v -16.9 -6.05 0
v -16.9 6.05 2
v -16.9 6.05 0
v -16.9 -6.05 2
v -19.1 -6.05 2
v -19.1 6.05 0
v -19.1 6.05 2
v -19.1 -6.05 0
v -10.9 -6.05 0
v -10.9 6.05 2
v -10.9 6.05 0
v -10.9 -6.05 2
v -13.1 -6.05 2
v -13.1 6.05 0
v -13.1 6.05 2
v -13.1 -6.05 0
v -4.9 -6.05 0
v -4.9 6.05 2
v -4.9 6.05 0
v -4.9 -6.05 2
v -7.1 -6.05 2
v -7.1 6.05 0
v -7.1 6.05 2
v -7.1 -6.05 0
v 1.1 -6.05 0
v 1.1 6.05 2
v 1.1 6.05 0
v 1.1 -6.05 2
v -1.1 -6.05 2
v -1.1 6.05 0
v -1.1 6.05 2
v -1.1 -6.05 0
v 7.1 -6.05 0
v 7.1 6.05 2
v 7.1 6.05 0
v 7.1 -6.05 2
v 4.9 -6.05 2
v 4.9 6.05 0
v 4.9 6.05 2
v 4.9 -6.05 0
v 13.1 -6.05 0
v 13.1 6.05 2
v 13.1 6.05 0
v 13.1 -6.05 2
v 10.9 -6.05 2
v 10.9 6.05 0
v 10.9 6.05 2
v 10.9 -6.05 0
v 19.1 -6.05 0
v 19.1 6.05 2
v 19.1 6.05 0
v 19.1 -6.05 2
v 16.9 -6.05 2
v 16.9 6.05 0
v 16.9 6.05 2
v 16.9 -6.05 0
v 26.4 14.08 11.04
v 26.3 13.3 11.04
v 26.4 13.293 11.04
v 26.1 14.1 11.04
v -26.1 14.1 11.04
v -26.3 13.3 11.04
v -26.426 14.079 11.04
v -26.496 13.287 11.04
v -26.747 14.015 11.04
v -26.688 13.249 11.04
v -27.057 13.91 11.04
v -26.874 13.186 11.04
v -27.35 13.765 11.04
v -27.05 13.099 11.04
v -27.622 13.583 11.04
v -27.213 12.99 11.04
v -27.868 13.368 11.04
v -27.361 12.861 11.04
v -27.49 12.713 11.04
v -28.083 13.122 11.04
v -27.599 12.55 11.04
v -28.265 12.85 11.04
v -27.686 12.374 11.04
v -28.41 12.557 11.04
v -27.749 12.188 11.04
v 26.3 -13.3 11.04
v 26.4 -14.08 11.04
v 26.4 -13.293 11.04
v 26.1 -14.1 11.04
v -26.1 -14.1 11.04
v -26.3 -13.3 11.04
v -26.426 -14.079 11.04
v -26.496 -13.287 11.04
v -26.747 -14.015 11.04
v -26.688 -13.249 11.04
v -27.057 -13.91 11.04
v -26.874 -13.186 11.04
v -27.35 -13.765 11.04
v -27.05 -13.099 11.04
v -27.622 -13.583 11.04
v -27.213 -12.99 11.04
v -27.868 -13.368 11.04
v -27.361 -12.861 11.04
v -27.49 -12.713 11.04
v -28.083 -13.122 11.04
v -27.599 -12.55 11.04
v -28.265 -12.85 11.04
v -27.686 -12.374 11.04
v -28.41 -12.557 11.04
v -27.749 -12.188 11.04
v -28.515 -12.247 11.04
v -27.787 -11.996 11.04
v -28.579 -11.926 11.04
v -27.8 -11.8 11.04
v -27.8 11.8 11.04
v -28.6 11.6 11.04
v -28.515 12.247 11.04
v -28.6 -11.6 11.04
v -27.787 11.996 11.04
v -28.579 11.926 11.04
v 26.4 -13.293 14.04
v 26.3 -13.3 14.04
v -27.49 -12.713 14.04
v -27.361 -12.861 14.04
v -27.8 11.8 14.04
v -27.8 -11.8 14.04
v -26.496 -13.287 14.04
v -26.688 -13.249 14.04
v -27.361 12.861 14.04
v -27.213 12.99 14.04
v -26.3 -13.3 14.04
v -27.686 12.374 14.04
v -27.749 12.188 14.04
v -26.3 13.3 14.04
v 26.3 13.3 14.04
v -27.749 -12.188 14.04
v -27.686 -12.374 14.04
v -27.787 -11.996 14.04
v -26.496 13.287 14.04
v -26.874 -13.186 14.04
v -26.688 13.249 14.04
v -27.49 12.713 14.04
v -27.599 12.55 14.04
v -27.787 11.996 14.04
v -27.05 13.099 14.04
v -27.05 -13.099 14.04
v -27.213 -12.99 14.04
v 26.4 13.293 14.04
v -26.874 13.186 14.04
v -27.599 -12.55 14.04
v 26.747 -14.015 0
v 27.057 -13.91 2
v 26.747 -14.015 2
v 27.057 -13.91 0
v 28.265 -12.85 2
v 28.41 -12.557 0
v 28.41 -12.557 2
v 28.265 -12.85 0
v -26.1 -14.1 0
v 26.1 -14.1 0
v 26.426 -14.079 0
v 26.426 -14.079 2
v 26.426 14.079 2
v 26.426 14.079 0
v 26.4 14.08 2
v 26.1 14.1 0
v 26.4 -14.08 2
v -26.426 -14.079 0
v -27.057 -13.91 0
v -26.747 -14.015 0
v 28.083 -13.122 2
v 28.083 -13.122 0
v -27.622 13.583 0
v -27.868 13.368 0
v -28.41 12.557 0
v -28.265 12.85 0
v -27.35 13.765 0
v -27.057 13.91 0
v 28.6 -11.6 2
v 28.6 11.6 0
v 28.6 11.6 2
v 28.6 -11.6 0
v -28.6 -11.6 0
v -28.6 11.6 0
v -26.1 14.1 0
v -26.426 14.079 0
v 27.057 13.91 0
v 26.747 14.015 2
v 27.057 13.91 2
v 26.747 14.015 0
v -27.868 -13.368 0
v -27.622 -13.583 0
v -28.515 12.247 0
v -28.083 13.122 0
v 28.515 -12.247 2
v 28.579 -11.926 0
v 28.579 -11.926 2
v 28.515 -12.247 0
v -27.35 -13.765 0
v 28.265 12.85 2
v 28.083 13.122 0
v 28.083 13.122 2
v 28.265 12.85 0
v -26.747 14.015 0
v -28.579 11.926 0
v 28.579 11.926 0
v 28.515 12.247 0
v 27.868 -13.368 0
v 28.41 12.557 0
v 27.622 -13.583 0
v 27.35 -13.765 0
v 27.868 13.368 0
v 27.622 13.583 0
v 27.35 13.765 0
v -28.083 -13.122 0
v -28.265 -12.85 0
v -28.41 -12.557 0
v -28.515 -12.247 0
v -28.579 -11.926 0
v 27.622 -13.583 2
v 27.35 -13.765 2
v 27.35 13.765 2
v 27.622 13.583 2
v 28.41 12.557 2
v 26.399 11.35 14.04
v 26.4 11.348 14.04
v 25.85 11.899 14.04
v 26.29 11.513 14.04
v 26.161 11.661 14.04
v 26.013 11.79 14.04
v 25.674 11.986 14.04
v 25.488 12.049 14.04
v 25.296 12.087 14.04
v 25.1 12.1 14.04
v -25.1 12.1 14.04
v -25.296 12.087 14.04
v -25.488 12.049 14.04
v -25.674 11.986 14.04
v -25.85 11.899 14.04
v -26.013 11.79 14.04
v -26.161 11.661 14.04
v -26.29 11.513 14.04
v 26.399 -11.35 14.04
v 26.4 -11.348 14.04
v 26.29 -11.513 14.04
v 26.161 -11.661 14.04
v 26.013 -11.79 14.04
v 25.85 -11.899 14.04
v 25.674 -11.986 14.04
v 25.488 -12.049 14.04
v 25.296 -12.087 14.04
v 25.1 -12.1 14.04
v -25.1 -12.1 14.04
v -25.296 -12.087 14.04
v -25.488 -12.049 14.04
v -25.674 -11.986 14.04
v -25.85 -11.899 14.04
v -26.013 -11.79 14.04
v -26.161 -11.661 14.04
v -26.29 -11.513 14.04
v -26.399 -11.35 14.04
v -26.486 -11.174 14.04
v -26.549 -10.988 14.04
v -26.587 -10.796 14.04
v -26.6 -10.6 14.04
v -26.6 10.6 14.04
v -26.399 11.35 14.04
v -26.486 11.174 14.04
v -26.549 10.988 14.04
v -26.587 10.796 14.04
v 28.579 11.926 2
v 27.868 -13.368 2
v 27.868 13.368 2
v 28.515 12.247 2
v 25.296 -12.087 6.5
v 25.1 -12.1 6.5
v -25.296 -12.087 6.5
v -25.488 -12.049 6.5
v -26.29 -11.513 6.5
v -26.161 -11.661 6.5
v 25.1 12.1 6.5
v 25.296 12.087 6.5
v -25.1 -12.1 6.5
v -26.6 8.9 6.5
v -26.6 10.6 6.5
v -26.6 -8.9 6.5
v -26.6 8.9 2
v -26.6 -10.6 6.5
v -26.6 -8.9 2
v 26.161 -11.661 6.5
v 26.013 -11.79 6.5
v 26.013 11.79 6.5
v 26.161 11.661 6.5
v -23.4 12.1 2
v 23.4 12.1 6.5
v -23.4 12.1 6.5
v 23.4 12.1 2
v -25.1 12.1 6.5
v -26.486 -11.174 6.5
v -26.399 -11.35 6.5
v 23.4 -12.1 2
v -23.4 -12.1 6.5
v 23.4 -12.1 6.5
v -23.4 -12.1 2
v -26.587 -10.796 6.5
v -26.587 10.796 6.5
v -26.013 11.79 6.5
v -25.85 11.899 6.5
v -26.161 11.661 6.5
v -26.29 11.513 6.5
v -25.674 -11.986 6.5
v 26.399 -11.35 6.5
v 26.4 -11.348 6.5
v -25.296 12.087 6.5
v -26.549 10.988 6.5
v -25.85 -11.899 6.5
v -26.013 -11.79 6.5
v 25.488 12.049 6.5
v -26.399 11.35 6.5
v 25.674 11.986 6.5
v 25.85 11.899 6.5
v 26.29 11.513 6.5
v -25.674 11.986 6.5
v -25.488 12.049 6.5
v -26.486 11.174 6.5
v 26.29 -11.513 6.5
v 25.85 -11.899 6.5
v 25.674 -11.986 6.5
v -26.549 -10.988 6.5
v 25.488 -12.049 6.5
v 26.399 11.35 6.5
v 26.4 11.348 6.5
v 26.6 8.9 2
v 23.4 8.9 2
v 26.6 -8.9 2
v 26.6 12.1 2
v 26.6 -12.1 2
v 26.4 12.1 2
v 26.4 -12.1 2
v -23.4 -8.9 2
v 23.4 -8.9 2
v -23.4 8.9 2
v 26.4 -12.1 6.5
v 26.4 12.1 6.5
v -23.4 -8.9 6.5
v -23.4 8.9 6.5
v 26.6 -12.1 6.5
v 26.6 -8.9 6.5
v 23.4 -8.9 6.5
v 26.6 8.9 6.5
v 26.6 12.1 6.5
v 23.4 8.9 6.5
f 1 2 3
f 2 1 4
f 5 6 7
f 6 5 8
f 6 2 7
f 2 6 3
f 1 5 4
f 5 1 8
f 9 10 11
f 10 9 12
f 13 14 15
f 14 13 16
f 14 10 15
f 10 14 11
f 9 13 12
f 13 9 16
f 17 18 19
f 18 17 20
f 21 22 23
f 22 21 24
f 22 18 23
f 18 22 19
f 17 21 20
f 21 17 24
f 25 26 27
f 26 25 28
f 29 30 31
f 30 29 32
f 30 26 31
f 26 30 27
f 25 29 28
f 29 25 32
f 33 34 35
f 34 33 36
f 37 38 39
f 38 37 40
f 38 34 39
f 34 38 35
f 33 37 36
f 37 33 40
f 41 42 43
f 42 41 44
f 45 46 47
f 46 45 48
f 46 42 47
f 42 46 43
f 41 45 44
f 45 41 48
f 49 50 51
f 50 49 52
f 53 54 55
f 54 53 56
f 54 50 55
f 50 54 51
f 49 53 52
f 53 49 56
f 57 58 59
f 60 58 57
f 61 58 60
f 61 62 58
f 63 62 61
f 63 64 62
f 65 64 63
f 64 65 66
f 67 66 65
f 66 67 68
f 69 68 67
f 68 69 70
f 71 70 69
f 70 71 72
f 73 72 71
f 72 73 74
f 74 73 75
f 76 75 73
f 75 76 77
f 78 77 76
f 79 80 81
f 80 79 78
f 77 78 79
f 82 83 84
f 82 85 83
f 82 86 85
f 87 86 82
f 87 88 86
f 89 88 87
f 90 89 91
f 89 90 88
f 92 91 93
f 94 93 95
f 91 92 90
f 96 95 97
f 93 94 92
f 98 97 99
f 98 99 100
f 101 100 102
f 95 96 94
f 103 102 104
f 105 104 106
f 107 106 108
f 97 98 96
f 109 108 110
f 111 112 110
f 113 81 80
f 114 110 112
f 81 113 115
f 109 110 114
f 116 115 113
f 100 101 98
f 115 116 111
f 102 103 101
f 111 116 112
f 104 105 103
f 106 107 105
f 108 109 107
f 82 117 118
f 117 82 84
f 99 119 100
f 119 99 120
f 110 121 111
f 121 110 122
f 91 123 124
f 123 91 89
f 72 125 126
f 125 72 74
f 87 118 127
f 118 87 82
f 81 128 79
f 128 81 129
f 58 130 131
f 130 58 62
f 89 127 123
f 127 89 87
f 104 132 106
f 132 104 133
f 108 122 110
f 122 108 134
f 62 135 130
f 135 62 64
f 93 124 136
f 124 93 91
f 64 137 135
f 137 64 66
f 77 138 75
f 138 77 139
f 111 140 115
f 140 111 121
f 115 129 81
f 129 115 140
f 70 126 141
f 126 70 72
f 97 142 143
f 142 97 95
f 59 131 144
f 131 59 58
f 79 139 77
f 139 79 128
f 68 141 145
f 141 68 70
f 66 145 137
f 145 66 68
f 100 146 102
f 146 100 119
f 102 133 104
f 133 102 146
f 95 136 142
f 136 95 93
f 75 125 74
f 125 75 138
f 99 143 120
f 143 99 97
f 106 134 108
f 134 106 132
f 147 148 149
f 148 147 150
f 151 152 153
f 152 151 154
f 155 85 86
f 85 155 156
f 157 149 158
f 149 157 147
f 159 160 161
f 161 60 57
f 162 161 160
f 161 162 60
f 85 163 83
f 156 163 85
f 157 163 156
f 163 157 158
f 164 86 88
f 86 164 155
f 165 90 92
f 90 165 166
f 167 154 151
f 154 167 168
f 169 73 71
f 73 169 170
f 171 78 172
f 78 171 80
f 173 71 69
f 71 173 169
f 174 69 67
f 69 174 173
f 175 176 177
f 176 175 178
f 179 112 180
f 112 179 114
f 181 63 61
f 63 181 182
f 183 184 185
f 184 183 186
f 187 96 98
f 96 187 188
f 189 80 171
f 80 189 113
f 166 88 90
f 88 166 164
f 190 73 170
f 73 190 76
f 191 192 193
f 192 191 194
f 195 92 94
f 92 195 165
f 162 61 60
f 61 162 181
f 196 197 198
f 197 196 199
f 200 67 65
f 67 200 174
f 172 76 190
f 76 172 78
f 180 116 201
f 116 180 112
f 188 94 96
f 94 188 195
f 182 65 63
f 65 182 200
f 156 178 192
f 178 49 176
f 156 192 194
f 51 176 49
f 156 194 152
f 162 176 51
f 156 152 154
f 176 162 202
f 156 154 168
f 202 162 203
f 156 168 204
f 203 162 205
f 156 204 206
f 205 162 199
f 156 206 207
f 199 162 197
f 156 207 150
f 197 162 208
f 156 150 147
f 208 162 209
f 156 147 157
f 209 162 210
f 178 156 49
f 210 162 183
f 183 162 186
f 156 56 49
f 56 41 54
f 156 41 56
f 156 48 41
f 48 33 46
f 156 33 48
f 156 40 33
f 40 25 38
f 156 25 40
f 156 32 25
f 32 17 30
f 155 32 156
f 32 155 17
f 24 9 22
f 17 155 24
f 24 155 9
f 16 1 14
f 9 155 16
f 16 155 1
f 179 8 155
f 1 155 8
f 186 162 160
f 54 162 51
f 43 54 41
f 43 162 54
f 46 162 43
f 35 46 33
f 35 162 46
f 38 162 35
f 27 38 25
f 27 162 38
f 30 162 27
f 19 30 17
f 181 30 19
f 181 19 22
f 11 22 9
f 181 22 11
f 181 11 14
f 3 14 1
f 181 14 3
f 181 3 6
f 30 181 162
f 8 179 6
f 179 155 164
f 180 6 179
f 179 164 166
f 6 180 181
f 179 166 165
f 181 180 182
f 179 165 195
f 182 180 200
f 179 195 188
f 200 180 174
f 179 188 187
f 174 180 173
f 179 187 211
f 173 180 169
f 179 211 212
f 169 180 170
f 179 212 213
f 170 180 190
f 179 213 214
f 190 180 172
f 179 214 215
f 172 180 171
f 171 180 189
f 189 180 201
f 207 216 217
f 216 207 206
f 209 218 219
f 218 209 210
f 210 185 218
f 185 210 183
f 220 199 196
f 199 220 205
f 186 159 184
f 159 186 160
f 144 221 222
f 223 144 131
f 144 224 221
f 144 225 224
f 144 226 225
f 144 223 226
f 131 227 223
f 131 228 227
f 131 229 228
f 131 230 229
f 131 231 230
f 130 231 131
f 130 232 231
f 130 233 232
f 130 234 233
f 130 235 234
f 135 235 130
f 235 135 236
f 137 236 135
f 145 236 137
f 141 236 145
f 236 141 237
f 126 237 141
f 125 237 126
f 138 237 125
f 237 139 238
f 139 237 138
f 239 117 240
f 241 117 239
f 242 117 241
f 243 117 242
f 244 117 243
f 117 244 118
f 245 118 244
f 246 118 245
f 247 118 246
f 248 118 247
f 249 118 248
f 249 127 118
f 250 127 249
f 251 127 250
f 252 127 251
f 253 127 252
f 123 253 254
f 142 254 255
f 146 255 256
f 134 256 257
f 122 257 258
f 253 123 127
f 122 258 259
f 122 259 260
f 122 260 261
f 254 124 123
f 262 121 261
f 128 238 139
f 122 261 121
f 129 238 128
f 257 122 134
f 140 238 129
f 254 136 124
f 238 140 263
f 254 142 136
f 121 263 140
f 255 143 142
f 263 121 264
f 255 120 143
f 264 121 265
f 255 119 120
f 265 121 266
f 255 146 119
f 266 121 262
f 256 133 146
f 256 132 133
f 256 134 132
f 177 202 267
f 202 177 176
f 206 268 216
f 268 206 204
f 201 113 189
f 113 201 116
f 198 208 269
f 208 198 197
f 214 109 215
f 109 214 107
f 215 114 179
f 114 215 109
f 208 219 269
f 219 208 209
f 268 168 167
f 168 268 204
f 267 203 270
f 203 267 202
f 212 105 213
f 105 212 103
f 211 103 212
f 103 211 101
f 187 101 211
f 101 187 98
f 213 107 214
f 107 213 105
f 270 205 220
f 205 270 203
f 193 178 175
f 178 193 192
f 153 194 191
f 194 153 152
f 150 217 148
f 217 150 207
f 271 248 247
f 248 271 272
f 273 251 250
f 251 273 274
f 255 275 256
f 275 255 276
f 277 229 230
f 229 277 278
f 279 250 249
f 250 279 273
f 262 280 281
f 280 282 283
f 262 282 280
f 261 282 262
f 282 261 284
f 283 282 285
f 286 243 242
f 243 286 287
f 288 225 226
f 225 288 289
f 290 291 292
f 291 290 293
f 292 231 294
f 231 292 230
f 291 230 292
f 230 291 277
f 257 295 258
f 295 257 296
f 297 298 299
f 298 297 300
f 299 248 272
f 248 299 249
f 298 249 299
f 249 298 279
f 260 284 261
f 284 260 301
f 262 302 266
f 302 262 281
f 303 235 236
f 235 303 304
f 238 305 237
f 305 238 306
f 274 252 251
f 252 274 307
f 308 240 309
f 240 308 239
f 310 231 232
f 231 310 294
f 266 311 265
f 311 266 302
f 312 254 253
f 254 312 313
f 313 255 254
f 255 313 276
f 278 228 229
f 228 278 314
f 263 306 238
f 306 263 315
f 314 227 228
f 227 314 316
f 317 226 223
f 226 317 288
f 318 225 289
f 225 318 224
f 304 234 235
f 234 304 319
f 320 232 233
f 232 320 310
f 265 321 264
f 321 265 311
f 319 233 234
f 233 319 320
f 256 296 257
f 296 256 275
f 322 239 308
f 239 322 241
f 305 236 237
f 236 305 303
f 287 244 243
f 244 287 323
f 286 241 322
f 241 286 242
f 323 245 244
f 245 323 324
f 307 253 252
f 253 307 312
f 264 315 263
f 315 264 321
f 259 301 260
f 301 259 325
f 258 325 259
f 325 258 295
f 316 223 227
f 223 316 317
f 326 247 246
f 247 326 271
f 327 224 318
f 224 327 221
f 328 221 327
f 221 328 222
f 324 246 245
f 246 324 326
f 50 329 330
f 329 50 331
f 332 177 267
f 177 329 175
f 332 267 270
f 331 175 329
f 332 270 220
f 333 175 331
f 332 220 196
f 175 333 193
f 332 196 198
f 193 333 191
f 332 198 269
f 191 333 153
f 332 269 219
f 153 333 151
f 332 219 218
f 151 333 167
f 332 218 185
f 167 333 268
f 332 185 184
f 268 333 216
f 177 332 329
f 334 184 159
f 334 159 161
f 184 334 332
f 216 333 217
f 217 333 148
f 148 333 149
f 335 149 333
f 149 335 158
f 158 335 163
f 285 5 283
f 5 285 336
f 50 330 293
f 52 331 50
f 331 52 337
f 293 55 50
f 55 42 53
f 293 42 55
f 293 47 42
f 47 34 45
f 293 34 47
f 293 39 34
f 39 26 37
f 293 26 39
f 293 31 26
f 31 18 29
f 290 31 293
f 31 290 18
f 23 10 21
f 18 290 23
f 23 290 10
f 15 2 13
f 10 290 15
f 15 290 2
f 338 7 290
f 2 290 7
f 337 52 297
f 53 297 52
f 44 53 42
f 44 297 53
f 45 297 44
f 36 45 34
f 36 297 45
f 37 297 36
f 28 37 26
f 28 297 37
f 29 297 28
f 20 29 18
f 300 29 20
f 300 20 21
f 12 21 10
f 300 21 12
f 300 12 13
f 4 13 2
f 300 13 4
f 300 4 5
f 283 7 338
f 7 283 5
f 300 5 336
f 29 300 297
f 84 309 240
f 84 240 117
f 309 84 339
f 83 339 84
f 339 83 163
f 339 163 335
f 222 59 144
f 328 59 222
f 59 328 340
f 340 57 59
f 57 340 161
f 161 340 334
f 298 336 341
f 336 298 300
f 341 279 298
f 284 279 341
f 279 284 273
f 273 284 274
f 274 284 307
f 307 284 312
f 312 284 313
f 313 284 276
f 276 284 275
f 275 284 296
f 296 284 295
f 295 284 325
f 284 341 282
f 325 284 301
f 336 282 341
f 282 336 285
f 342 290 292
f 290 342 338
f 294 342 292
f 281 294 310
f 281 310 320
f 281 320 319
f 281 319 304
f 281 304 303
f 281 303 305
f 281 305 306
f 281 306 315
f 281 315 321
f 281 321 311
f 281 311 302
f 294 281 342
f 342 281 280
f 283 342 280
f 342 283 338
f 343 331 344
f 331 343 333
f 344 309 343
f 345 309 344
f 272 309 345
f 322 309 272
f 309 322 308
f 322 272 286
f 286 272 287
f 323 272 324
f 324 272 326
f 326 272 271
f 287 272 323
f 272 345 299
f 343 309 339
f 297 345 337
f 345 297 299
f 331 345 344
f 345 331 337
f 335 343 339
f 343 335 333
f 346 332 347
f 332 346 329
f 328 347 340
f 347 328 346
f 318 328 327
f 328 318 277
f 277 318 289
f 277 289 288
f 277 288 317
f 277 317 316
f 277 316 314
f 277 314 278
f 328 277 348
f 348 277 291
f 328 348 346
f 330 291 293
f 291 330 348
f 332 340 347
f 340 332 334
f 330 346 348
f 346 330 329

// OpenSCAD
// =============================================================================
//  UPS Bridge enclosure
//  Adafruit ESP32-S3 Feather + Adafruit USB Host FeatherWing (MAX3421E)
//  Companion to github.com/bryanpinos/apc-ups-bridge
//
//  Two parts, both print flat with no supports.
//
//  DESIGN NOTE: both USB ports exit the SAME end. That end gets a central
//  full-height slot for the connectors but KEEPS its corner pillars; the far end
//  is a solid wall. The stack drops in from above and is then captured
//  lengthwise -- pillars one way, solid wall the other -- with no screw needed.
//    OpenSCAD -o out.stl -D 'part="base"'    case.scad
//    OpenSCAD -o out.stl -D 'part="lid"'     case.scad
//    OpenSCAD -o out.stl -D 'part="fittest"' case.scad   // 6 mm test slice
// =============================================================================

// ---------- BOARD DIMENSIONS -------------------------------------------------
// Feather spec is 50.8 x 22.86 mm; the Host wing is 52.0 x 22.8 x 8.8 mm.
// Cavity is sized to the larger footprint so both fit.
pcb_l        = 52.0;
pcb_w        = 23.0;
pcb_t        = 1.6;

// Measured on a real Feather + USB Host FeatherWing stack with plain male/
// female headers. Re-measure if you use stacking headers, which are taller.
stack_h      = 10.8;   // MEASURED: 14.0 overall (Feather PCB bottom -> wing PCB top)
                       //           minus two 1.6 mm PCBs = 10.8
above_wing_h = 7.4;    // MEASURED: 21.4 (Feather PCB bottom -> USB-A top)
                       //           minus 14.0 (to wing PCB top) = 7.4
headroom     = 2.5;    // air above the USB-A shell. Not just lid clearance: the
                       // face plate needs material ABOVE the USB-A hole, and at
                       // 1.0 it was left with 0.7 mm and broke out of the edge.

under_h      = 4.5;    // clearance below the Feather for solder tails / LiPo lead

// ---------- CONNECTOR END ----------------------------------------------------
// Both USB ports exit the same end. That end is left fully open in the base and
// lid, and closed afterwards by a separate FACE PLATE carrying one exact hole per
// connector. This is the only way to get two clean openings: a connector can only
// pass through an opening that is open in the direction of assembly, and no
// horizontal parting line runs through both a ~7 mm and a ~22 mm connector.
// The face plate also blocks the board from sliding out, so it replaces the
// corner pillars as the retention feature.
conn_end     = 1;      // +1 or -1: which end the connectors face

// Openings, measured from the CAVITY FLOOR. Verify against the real boards.
// MEASURED plug overmold dimensions -- the real constraint. The receptacle is
// irrelevant: what has to pass through is the plug, and its overmold is much
// larger. Measure the actual cables that will live in this case; a chunky
// charging lead can be half again the size of a slim one.
usbc_plug_w  = 11.0;   // measured
usbc_plug_h  = 6.6;
usba_plug_w  = 15.1;   // measured
usba_plug_h  = 7.7;
plug_clear   = 1.2;    // total added, i.e. 0.6 per side. Deliberately loose:
                       // the connector CENTRE heights below are derived from
                       // caliper measurements that close to about +/-0.5 mm, and
                       // a plug that rattles slightly still mates -- one that is
                       // 0.4 mm proud of the hole does not.

// Connector CENTRE heights, from the FEATHER PCB BOTTOM -- the same datum as the
// 14.0 and 21.4 stack measurements. Closed out from three caliper readings:
//   wing PCB top          = 14.0   -> USB-A shell bottom (it sits flush)
//   USB-A top             = 21.4   -> USB-A spans 14.0..21.4, centre 17.7
//   clear gap between the = 10.2   -> USB-C top = 14.0 - 10.2 = 3.8, and it sits
//   two connector shells              on the Feather PCB top (1.6), so 1.6..3.8,
//                                     centre 2.7
// Note the USB-C body works out only 2.2 mm proud of the PCB, which means it is
// a mid-mount part sitting in a board cutout, not a 3.2 mm top-mount one. The
// three measurements close on each other, so trust them over the datasheet.
usbc_c       = 2.7;
usba_c       = 17.7;

usbc_z       = under_h + usbc_c;   // converted to cavity-floor datum
usba_z       = under_h + usba_c;

usbc_w       = usbc_plug_w + plug_clear;
usbc_h       = usbc_plug_h + plug_clear;
usba_w       = usba_plug_w + plug_clear;
usba_h       = usba_plug_h + plug_clear;
// Horizontal position of each opening, across the plate width. Both connectors
// are centred on the board width, so both are 0.
usbc_y       = 0.0;
usba_y       = 0.0;

// An undefined variable here does NOT fail: OpenSCAD warns, discards the whole
// translate, and quietly cuts the hole at the plate origin. That shipped a plate
// with the USB-C opening 3.2 mm low. Fail loudly instead.
assert(is_num(usbc_y) && is_num(usba_y) && is_num(usbc_c) && is_num(usba_c),
       "connector opening positions must all be numbers");

face_t       = 1.2;    // per layer (flange + plug) -> 2.4 mm total, was 4.0.
                       // Plate thickness directly eats plug insertion depth.
face_fit     = 0.25;   // per-side interference into the end opening

// ---------- SHELL ------------------------------------------------------------
wall         = 2.0;
floor_t      = 2.0;
gap          = 0.6;    // per-side clearance around the PCB
corner_r     = 2.5;
lip_h        = 3.0;
lip_t        = 1.2;
vent_slots   = true;

part = "base";
$fn = 48;

// ---------- DERIVED ----------------------------------------------------------
cav_l     = pcb_l + 2*gap;
cav_w     = pcb_w + 2*gap;
cav_h     = under_h + pcb_t + stack_h + pcb_t + above_wing_h + headroom;
out_l     = cav_l + 2*wall;
out_w     = cav_w + 2*wall;
feather_z = under_h;                       // PCB underside above inner floor
wing_z    = under_h + pcb_t + stack_h;
base_h    = floor_t + under_h + pcb_t + stack_h * 0.55;
lid_h     = floor_t + (cav_h - (base_h - floor_t));

// Rounded rectangular prism, centred in X/Y, sitting on z=0.
module rrect(l, w, h, r) {
  linear_extrude(height = h)
    offset(r = r) offset(delta = -r) square([l, w], center = true);
}

// Corner posts the Feather rests on.
module posts() {
  p = 3.2;
  for (x = [-1, 1], y = [-1, 1])
    translate([x * (cav_l/2 - p/2), y * (cav_w/2 - p/2), floor_t])
      translate([-p/2, -p/2, 0])
        cube([p, p, under_h]);
}

// Opens the connector end completely in the base and lid; the face plate closes
// it. The far end wall stays solid.
module conn_slot() {
  h = cav_h + lip_h + 20;
  translate([conn_end * (out_l/2 - wall/2), 0, floor_t + h/2])
    cube([wall + 0.4, out_w + 4, h], center = true);
}

// ---------- FACE PLATE -------------------------------------------------------
// Presses into the open connector end after the stack is in. Built in its own
// frame: y is height above the CAVITY FLOOR, so usbc_z / usba_z drop straight in.
// The outer flange seats against the case end; the plug is an interference fit
// in the cavity mouth. Print it flat, holes facing up.
// Straight bore plus an outward chamfer, so a plug overmold can nose into the
// opening instead of butting against a flat face.
module hole(y, z, w, h) {
  translate([y, z, -1])
    linear_extrude(height = face_t * 4)
      offset(r = 0.6) offset(delta = -0.6) square([w, h], center = true);
  translate([y, z, -0.01])
    linear_extrude(height = 1.2, scale = 1.0)
      offset(r = 0.6) offset(delta = -0.6) square([w + 1.6, h + 1.6], center = true);
}

module face() {
  difference() {
    union() {
      translate([0, cav_h/2, 0])
        rrect(out_w, cav_h + 2*wall, face_t, corner_r * 0.6);
      translate([0, cav_h/2, face_t])
        rrect(cav_w + 2*face_fit, cav_h + 2*face_fit, face_t, corner_r * 0.4);
    }
    hole(usbc_y, usbc_z, usbc_w, usbc_h);
    hole(usba_y, usba_z, usba_w, usba_h);
  }
}

module floor_vents() {
  if (vent_slots)
    for (i = [-3 : 3])
      translate([i * 6, 0, -1])
        cube([2.2, cav_w * 0.5, floor_t + 2], center = false);
}

module floor_vents_c() {
  if (vent_slots)
    for (i = [-3 : 3])
      translate([i * 6, 0, floor_t/2])
        cube([2.2, cav_w * 0.5, floor_t * 3], center = true);
}

// ---------- BASE -------------------------------------------------------------
module base() {
  difference() {
    rrect(out_l, out_w, base_h, corner_r);
    translate([0, 0, floor_t]) rrect(cav_l, cav_w, base_h, corner_r * 0.6);
    conn_slot();
    floor_vents_c();
    // rebate at the rim for the lid lip
    translate([0, 0, base_h - lip_h])
      difference() {
        rrect(out_l + 2, out_w + 2, lip_h + 2, corner_r);
        rrect(cav_l + 2*lip_t, cav_w + 2*lip_t, lip_h + 4, corner_r * 0.6);
      }
  }
  posts();
}

// ---------- LID --------------------------------------------------------------
// A box open at the bottom, plus a thinner skirt that drops into the rebate
// cut around the base rim, giving a stepped joint with no visible gap.
module lid() {
  difference() {
    union() {
      rrect(out_l, out_w, lid_h, corner_r);
      translate([0, 0, -lip_h]) rrect(out_l, out_w, lip_h, corner_r);
    }
    // hollow the body, leaving floor_t as the top plate
    translate([0, 0, -0.01])
      rrect(cav_l, cav_w, lid_h - floor_t + 0.01, corner_r * 0.6);
    // skirt bore, sized to clear the step left on the base rim
    translate([0, 0, -lip_h - 0.01])
      rrect(cav_l + 2*lip_t + 0.3, cav_w + 2*lip_t + 0.3, lip_h + 0.02, corner_r * 0.6);
    conn_slot();
    top_vents();
  }
}

module top_vents() {
  if (vent_slots)
    for (i = [-3 : 3])
      translate([i * 6, 0, lid_h - floor_t/2])
        cube([2.2, cav_w * 0.5, floor_t * 3], center = true);
}


// ---------- FIT TEST ---------------------------------------------------------
// Must be TALLER than the corner posts (floor_t + under_h = 6.5 mm), otherwise
// the posts get sliced level with the wall tops and a board laid in rests on top
// of everything -- which tests nothing. fit_h leaves real wall above the board so
// the width clearance is actually checkable.
fit_h = floor_t + under_h + pcb_t + 2.0;

module fittest() {
  intersection() {
    base();
    translate([-(out_l+10)/2, -(out_w+10)/2, 0]) cube([out_l+10, out_w+10, fit_h]);
  }
}

if      (part == "base")    base();
else if (part == "lid")     lid();
else if (part == "fittest") fittest();
else if (part == "face")    face();
